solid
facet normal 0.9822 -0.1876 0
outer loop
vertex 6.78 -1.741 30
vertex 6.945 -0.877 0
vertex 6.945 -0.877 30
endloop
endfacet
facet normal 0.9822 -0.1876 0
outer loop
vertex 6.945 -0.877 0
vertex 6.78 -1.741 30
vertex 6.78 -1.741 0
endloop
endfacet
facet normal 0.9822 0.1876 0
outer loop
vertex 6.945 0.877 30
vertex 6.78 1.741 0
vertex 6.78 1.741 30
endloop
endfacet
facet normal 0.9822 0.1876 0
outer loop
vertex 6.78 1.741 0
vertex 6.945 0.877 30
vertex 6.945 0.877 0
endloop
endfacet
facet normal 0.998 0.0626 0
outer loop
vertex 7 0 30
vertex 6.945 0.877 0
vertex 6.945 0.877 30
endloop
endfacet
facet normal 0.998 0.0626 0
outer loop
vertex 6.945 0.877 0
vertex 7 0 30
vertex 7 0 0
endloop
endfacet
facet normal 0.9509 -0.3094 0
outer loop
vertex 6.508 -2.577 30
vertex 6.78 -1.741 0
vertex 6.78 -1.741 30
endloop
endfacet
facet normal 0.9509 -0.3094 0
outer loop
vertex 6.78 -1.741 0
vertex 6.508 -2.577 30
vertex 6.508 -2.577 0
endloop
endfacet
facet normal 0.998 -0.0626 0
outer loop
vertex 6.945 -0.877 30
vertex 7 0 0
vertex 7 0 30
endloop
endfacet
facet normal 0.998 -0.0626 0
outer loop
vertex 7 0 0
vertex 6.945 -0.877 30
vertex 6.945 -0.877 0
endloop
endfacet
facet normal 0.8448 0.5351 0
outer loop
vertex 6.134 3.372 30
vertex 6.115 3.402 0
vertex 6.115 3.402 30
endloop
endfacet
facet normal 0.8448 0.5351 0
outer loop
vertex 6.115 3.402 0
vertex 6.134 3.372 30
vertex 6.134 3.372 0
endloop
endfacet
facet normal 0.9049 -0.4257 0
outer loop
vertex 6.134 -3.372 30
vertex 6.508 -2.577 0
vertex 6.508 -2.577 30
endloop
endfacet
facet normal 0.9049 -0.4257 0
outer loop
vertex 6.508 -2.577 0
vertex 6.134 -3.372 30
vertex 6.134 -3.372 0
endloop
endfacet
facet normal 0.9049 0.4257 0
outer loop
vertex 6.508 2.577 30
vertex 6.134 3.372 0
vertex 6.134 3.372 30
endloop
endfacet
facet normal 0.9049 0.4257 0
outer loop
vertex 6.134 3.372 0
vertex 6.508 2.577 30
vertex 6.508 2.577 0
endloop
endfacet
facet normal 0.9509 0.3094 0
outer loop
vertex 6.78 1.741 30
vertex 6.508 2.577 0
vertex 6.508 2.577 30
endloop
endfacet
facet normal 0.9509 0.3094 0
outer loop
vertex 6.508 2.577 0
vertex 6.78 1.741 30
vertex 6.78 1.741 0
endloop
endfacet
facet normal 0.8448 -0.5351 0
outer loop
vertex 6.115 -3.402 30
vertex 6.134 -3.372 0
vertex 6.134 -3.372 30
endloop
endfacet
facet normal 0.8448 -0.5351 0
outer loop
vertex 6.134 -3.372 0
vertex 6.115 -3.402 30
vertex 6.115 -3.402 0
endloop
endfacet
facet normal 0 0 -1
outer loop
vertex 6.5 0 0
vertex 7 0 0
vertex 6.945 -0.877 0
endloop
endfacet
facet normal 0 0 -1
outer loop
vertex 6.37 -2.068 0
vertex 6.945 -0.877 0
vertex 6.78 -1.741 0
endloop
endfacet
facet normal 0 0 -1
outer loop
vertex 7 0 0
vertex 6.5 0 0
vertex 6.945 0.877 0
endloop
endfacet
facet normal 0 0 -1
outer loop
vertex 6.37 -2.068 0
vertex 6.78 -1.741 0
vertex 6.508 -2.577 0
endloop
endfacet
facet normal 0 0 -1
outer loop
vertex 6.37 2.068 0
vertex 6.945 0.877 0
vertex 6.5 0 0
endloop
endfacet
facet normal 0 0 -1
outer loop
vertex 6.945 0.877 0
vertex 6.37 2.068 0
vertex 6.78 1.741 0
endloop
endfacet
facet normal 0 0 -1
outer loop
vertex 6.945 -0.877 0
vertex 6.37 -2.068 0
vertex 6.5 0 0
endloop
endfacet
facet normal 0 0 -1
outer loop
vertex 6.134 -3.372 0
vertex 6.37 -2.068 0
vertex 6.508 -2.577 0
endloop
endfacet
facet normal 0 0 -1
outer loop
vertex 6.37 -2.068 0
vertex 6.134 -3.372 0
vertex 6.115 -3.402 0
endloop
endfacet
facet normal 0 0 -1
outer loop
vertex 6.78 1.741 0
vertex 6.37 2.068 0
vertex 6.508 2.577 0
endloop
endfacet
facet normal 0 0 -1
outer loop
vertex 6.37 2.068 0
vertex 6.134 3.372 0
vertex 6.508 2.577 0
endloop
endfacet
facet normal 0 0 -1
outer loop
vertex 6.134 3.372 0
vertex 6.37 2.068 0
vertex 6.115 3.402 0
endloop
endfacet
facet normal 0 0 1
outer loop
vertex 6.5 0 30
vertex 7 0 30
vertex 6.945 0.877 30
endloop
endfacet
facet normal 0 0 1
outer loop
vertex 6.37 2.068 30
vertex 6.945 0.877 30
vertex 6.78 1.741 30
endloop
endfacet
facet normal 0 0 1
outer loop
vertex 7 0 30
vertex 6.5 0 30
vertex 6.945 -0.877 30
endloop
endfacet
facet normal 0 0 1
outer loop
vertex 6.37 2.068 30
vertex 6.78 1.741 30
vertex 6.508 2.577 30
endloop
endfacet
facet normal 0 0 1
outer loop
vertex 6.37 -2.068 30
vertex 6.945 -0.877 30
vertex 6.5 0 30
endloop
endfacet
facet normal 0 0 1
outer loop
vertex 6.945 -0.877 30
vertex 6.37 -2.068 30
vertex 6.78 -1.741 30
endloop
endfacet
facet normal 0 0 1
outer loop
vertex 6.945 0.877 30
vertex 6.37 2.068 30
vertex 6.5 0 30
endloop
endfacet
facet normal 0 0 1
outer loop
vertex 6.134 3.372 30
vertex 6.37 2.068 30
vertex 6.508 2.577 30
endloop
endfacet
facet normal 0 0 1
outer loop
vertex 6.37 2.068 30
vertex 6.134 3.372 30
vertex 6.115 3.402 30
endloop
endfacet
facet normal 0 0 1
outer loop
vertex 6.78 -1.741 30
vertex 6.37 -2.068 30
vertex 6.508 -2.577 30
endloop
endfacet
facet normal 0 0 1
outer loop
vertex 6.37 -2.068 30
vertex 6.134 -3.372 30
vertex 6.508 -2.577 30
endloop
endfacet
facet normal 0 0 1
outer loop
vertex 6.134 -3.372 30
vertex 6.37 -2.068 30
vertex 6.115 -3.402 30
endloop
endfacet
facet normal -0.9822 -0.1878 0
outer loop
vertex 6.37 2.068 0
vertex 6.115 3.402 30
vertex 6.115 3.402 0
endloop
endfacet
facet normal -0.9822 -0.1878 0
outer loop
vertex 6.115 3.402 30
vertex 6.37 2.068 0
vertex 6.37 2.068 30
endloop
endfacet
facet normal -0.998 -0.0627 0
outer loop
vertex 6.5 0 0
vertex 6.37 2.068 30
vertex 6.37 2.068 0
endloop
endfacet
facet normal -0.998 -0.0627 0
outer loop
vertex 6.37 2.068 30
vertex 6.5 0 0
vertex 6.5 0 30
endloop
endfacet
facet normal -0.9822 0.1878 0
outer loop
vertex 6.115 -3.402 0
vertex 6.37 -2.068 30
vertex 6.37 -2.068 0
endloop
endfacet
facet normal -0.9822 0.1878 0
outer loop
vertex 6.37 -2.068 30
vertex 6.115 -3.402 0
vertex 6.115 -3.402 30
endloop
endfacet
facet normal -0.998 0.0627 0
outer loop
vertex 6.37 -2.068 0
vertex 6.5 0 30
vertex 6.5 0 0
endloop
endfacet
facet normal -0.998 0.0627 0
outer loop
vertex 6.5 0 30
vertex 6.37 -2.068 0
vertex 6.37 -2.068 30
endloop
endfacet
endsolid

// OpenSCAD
$fn = 50;


difference() {
	union() {
		cylinder(h = 30, r = 7.0000000000);
		translate(v = [-13.0000000000, 0, 0]) {
			cylinder(h = 30, r = 7.0000000000);
		}
	}
	union() {
		cylinder(h = 30, r = 3.2500000000);
		cylinder(h = 30, r = 1.8000000000);
		cylinder(h = 30, r = 1.8000000000);
		cylinder(h = 30, r = 1.8000000000);
		translate(v = [-17.5000000000, 0, 0]) {
			hull() {
				translate(v = [-3.7500000000, 0.0000000000, 0]) {
					cylinder(h = 30, r = 10.5000000000);
				}
				translate(v = [3.7500000000, 0.0000000000, 0]) {
					cylinder(h = 30, r = 10.5000000000);
				}
				translate(v = [-3.7500000000, -0.0000000000, 0]) {
					cylinder(h = 30, r = 10.5000000000);
				}
				translate(v = [3.7500000000, -0.0000000000, 0]) {
					cylinder(h = 30, r = 10.5000000000);
				}
			}
		}
		translate(v = [-10.0000000000, 0, 0.0000000000]) {
			cylinder(h = 30, r = 16.5000000000);
		}
	}
}
